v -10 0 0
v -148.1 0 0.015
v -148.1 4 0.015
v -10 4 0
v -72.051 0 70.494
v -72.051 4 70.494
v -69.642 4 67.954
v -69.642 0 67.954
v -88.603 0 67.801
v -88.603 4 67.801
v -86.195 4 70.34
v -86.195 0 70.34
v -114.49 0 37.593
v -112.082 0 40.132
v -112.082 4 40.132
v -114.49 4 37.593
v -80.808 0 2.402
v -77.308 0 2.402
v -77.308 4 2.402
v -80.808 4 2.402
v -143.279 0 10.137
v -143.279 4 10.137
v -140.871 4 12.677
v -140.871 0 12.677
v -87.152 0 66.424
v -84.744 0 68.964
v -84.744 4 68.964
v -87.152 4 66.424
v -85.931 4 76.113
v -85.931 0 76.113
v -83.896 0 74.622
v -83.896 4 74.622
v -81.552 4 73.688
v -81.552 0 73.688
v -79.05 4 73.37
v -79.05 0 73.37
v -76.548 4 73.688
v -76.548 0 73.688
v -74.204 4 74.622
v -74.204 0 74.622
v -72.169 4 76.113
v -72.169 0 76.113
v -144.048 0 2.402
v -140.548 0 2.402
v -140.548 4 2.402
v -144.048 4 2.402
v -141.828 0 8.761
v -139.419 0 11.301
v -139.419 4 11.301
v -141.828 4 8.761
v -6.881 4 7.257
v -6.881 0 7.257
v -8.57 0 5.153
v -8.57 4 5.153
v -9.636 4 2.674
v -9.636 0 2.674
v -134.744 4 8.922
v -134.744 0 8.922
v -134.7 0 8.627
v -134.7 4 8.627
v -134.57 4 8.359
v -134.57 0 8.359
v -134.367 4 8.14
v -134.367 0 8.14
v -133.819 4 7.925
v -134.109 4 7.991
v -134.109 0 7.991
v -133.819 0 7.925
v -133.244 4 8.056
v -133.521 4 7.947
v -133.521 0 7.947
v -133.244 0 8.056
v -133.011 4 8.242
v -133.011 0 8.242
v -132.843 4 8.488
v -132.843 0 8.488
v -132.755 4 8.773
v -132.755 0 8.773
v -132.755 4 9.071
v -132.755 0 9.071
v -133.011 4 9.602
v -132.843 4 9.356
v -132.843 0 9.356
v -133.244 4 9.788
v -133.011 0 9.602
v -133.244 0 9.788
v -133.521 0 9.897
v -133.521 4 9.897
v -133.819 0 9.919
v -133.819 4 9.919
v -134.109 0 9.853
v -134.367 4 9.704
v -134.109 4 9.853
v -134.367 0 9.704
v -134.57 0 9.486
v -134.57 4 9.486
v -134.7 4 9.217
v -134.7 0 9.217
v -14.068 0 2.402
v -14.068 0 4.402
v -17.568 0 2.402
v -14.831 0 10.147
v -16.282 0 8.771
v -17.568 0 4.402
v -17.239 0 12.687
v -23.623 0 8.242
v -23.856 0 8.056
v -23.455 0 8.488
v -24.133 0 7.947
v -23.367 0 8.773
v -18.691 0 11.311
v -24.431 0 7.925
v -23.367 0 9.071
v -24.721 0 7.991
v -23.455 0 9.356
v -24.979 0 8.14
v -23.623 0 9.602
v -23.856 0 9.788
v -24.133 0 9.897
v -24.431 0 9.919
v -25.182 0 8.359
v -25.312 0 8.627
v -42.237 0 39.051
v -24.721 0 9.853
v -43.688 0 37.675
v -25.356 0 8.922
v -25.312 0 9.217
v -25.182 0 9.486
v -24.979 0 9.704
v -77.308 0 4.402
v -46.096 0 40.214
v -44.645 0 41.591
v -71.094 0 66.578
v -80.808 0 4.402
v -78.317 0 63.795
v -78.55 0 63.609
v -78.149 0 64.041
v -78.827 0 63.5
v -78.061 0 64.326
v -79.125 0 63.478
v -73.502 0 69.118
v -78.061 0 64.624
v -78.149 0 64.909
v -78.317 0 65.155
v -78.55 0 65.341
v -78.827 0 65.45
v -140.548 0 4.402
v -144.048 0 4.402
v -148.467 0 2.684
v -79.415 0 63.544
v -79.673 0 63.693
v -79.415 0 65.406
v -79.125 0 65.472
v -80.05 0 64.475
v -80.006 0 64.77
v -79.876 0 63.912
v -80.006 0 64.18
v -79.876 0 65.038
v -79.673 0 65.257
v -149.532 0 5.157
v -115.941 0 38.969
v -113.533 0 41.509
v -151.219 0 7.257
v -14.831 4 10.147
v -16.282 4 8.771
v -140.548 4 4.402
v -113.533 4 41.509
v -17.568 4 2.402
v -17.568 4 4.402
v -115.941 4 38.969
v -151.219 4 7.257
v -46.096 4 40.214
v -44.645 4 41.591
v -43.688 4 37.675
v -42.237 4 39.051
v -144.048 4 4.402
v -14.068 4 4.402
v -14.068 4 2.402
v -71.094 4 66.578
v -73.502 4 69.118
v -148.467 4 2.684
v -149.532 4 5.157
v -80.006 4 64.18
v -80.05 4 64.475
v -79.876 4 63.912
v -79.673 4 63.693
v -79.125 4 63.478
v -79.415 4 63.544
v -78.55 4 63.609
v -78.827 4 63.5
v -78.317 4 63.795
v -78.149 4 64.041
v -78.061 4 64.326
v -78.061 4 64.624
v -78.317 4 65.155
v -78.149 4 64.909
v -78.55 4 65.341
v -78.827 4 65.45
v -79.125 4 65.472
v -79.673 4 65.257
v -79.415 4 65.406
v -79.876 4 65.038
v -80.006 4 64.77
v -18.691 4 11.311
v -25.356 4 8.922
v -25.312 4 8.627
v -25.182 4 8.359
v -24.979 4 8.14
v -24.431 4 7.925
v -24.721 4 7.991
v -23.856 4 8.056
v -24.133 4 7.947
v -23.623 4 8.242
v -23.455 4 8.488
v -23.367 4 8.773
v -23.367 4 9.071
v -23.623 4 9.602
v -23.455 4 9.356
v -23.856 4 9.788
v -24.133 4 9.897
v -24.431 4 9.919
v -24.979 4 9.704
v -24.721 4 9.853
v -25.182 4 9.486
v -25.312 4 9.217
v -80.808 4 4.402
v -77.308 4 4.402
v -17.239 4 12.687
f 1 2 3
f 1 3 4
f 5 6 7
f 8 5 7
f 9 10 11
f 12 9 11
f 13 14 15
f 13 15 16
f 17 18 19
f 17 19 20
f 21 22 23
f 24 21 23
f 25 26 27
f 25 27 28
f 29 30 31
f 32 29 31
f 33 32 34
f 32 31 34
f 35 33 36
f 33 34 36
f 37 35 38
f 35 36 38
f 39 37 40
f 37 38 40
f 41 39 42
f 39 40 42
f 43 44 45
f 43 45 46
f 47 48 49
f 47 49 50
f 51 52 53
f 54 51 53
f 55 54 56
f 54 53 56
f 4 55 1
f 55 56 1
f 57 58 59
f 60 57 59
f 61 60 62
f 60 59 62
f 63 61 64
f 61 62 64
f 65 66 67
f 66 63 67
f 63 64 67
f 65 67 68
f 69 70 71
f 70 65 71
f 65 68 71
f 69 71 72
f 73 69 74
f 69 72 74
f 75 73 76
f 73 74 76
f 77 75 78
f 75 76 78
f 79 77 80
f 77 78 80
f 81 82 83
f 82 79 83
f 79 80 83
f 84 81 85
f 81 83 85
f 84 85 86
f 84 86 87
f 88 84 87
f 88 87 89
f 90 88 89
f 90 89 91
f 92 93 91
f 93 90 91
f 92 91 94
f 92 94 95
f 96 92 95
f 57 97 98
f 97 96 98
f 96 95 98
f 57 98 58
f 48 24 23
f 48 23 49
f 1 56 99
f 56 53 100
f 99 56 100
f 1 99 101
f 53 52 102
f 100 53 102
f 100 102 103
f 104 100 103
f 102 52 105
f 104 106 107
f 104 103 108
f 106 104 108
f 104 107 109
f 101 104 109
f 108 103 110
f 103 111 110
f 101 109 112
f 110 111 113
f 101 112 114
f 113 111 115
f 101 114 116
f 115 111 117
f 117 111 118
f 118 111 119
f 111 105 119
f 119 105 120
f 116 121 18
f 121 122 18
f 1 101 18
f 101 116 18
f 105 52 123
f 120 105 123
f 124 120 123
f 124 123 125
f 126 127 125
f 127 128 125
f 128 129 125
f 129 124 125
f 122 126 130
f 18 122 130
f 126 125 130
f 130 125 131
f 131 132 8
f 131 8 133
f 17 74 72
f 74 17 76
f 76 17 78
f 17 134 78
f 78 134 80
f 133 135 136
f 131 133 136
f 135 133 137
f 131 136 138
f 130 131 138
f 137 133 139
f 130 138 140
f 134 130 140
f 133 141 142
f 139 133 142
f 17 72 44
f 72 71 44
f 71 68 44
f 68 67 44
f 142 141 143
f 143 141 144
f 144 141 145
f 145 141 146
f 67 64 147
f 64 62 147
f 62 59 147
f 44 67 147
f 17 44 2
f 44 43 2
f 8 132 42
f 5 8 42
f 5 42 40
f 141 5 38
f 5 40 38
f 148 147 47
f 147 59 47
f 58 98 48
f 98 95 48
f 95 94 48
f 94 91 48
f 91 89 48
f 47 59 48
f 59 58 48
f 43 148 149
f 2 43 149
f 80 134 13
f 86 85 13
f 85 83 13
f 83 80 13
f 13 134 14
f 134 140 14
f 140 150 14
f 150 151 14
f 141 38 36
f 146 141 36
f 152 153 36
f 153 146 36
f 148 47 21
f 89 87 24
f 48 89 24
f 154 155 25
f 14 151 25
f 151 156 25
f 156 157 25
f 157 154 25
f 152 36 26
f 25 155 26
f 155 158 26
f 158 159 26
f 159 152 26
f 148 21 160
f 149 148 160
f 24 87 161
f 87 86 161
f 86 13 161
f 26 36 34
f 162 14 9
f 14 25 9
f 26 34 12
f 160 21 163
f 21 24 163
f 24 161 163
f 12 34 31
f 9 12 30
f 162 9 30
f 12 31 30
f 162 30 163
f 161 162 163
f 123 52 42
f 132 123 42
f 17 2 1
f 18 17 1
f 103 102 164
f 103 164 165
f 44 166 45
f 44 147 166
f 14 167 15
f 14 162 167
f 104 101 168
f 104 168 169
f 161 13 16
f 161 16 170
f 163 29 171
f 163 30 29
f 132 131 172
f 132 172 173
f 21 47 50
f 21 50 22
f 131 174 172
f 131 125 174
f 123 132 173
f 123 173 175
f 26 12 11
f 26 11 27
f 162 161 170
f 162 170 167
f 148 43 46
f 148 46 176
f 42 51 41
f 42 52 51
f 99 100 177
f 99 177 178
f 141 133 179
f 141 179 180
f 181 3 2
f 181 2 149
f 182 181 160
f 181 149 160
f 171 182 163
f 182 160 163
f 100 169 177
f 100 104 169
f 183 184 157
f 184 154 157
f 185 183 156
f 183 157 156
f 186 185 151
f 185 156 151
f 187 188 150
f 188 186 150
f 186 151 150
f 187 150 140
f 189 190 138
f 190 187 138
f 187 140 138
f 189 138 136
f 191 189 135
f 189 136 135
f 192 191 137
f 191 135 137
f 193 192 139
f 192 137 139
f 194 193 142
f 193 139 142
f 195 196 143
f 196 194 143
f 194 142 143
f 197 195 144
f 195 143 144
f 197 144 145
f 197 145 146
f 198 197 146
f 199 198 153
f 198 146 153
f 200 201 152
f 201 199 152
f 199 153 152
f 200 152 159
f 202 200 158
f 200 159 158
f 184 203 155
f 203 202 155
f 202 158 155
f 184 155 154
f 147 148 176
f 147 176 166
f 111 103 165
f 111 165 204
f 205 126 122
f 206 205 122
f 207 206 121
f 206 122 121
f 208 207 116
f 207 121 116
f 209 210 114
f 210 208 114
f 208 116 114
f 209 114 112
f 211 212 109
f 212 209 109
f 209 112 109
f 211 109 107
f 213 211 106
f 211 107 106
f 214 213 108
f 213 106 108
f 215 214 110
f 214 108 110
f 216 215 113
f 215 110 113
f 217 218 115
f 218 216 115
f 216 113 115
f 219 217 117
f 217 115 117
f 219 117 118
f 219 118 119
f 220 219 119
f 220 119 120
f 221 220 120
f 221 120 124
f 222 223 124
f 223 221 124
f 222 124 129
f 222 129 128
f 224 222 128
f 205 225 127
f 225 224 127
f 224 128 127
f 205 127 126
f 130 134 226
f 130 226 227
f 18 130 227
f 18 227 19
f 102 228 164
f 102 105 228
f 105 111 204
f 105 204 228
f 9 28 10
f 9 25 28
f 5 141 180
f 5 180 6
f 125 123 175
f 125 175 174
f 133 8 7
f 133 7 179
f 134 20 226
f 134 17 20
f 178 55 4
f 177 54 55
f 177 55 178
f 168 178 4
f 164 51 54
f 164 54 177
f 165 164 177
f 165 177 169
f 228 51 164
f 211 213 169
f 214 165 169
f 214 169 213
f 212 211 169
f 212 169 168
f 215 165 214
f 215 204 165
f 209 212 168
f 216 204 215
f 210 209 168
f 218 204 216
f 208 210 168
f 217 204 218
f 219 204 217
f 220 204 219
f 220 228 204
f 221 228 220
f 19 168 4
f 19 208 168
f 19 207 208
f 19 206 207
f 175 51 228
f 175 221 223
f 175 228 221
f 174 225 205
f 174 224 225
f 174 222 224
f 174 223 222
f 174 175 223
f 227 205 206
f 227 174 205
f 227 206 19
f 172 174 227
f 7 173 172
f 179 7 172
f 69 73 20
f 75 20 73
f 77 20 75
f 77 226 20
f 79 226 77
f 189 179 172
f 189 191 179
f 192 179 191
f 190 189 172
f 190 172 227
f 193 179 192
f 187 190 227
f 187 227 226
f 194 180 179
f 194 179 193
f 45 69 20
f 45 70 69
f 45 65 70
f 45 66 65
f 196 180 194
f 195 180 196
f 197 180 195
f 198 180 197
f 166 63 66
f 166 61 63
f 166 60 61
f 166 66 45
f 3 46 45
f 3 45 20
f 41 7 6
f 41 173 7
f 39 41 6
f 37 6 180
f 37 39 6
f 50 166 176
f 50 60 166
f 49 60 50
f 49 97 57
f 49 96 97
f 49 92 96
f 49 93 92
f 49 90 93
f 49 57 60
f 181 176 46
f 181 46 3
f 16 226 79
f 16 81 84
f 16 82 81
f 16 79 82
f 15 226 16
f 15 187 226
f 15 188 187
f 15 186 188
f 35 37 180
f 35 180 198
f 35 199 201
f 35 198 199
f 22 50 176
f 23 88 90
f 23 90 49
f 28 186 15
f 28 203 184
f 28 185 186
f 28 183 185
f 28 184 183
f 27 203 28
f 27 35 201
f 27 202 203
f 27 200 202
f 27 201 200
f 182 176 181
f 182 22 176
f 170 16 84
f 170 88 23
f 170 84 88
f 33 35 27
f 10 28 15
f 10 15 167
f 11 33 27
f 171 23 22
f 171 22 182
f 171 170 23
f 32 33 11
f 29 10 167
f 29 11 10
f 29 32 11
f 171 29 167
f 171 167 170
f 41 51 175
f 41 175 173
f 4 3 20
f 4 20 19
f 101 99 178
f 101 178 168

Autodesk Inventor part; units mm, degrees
ref_plane "YZ Plane" through (0, 0, 0) normal (1, 0, 0) x (0, 1, 0)
ref_plane "XZ Plane" through (0, 0, 0) normal (0, 1, 0) x (-1, 0, 0)
ref_plane "XY Plane" through (0, 0, 0) normal (0, 0, 1) x (1, 0, 0)
sketch "Sketch1" plane through (0, 0, 0) normal (0, 1, 0) x (-1, 0, 0)
  arc A0 (10, 0) -> (6.8806, 7.2566) centre (0, 0) ccw
  arc A1 (151.2194, 7.2566) -> (148.1, 0.0154) centre (158.1, 0) ccw
  circle A2 centre (79.05, 64.475) radius 1
  circle A3 centre (133.744, 8.9222) radius 1
  circle A4 centre (24.356, 8.9222) radius 1
  line L0 (6.8806, 7.2566) -> (72.1694, 76.1134)
  line L1 (85.9306, 76.1134) -> (151.2194, 7.2566)
  line L2 (148.1, 0.0154) -> (10, 0)
  arc A5 (72.1694, 76.1134) -> (85.9306, 76.1134) centre (79.05, 83.37) ccw
  line L3 (14.0684, 2.4018) -> (17.5684, 2.4018)
  line L4 (17.5684, 2.4018) -> (17.5684, 4.4018)
  line L5 (17.5684, 4.4018) -> (14.0684, 4.4018)
  line L6 (14.0684, 4.4018) -> (14.0684, 2.4018)
  line L7 (77.3084, 2.4018) -> (80.8084, 2.4018)
  line L8 (80.8084, 2.4018) -> (80.8084, 4.4018)
  line L9 (80.8084, 4.4018) -> (77.3084, 4.4018)
  line L10 (77.3084, 4.4018) -> (77.3084, 2.4018)
  line L11 (140.5484, 2.4018) -> (144.0484, 2.4018)
  line L12 (144.0484, 2.4018) -> (144.0484, 4.4018)
  line L13 (144.0484, 4.4018) -> (140.5484, 4.4018)
  line L14 (140.5484, 4.4018) -> (140.5484, 2.4018)
  line L15 (16.2824, 8.7713) -> (18.6906, 11.3111)
  line L16 (18.6906, 11.3111) -> (17.2392, 12.6872)
  line L17 (17.2392, 12.6872) -> (14.831, 10.1474)
  line L18 (14.831, 10.1474) -> (16.2824, 8.7713)
  line L19 (43.688, 37.6746) -> (46.0962, 40.2145)
  line L20 (46.0962, 40.2145) -> (44.6449, 41.5906)
  line L21 (44.6449, 41.5906) -> (42.2367, 39.0508)
  line L22 (42.2367, 39.0508) -> (43.688, 37.6746)
  line L23 (71.0937, 66.578) -> (73.5019, 69.1178)
  line L24 (73.5019, 69.1178) -> (72.0506, 70.4939)
  line L25 (72.0506, 70.4939) -> (69.6424, 67.9541)
  line L26 (69.6424, 67.9541) -> (71.0937, 66.578)
  line L27 (143.2789, 10.1369) -> (140.8707, 12.6767)
  line L28 (140.8707, 12.6767) -> (139.4194, 11.3006)
  line L29 (139.4194, 11.3006) -> (141.8276, 8.7608)
  line L30 (141.8276, 8.7608) -> (143.2789, 10.1369)
  line L31 (115.941, 38.9688) -> (113.5329, 41.5086)
  line L32 (113.5329, 41.5086) -> (112.0815, 40.1325)
  line L33 (112.0815, 40.1325) -> (114.4897, 37.5927)
  line L34 (114.4897, 37.5927) -> (115.941, 38.9688)
  line L35 (88.6032, 67.8006) -> (86.195, 70.3404)
  line L36 (86.195, 70.3404) -> (84.7437, 68.9643)
  line L37 (84.7437, 68.9643) -> (87.1519, 66.4245)
  line L38 (87.1519, 66.4245) -> (88.6032, 67.8006)
  point P0 (148.1, 0.0154)
  point P1 (151.2194, 7.2566)
  point P2 (85.9306, 76.1134)
extrude "Extrusion1" add sketch "Sketch1" along normal blind 4
properties part number "aab_face"
